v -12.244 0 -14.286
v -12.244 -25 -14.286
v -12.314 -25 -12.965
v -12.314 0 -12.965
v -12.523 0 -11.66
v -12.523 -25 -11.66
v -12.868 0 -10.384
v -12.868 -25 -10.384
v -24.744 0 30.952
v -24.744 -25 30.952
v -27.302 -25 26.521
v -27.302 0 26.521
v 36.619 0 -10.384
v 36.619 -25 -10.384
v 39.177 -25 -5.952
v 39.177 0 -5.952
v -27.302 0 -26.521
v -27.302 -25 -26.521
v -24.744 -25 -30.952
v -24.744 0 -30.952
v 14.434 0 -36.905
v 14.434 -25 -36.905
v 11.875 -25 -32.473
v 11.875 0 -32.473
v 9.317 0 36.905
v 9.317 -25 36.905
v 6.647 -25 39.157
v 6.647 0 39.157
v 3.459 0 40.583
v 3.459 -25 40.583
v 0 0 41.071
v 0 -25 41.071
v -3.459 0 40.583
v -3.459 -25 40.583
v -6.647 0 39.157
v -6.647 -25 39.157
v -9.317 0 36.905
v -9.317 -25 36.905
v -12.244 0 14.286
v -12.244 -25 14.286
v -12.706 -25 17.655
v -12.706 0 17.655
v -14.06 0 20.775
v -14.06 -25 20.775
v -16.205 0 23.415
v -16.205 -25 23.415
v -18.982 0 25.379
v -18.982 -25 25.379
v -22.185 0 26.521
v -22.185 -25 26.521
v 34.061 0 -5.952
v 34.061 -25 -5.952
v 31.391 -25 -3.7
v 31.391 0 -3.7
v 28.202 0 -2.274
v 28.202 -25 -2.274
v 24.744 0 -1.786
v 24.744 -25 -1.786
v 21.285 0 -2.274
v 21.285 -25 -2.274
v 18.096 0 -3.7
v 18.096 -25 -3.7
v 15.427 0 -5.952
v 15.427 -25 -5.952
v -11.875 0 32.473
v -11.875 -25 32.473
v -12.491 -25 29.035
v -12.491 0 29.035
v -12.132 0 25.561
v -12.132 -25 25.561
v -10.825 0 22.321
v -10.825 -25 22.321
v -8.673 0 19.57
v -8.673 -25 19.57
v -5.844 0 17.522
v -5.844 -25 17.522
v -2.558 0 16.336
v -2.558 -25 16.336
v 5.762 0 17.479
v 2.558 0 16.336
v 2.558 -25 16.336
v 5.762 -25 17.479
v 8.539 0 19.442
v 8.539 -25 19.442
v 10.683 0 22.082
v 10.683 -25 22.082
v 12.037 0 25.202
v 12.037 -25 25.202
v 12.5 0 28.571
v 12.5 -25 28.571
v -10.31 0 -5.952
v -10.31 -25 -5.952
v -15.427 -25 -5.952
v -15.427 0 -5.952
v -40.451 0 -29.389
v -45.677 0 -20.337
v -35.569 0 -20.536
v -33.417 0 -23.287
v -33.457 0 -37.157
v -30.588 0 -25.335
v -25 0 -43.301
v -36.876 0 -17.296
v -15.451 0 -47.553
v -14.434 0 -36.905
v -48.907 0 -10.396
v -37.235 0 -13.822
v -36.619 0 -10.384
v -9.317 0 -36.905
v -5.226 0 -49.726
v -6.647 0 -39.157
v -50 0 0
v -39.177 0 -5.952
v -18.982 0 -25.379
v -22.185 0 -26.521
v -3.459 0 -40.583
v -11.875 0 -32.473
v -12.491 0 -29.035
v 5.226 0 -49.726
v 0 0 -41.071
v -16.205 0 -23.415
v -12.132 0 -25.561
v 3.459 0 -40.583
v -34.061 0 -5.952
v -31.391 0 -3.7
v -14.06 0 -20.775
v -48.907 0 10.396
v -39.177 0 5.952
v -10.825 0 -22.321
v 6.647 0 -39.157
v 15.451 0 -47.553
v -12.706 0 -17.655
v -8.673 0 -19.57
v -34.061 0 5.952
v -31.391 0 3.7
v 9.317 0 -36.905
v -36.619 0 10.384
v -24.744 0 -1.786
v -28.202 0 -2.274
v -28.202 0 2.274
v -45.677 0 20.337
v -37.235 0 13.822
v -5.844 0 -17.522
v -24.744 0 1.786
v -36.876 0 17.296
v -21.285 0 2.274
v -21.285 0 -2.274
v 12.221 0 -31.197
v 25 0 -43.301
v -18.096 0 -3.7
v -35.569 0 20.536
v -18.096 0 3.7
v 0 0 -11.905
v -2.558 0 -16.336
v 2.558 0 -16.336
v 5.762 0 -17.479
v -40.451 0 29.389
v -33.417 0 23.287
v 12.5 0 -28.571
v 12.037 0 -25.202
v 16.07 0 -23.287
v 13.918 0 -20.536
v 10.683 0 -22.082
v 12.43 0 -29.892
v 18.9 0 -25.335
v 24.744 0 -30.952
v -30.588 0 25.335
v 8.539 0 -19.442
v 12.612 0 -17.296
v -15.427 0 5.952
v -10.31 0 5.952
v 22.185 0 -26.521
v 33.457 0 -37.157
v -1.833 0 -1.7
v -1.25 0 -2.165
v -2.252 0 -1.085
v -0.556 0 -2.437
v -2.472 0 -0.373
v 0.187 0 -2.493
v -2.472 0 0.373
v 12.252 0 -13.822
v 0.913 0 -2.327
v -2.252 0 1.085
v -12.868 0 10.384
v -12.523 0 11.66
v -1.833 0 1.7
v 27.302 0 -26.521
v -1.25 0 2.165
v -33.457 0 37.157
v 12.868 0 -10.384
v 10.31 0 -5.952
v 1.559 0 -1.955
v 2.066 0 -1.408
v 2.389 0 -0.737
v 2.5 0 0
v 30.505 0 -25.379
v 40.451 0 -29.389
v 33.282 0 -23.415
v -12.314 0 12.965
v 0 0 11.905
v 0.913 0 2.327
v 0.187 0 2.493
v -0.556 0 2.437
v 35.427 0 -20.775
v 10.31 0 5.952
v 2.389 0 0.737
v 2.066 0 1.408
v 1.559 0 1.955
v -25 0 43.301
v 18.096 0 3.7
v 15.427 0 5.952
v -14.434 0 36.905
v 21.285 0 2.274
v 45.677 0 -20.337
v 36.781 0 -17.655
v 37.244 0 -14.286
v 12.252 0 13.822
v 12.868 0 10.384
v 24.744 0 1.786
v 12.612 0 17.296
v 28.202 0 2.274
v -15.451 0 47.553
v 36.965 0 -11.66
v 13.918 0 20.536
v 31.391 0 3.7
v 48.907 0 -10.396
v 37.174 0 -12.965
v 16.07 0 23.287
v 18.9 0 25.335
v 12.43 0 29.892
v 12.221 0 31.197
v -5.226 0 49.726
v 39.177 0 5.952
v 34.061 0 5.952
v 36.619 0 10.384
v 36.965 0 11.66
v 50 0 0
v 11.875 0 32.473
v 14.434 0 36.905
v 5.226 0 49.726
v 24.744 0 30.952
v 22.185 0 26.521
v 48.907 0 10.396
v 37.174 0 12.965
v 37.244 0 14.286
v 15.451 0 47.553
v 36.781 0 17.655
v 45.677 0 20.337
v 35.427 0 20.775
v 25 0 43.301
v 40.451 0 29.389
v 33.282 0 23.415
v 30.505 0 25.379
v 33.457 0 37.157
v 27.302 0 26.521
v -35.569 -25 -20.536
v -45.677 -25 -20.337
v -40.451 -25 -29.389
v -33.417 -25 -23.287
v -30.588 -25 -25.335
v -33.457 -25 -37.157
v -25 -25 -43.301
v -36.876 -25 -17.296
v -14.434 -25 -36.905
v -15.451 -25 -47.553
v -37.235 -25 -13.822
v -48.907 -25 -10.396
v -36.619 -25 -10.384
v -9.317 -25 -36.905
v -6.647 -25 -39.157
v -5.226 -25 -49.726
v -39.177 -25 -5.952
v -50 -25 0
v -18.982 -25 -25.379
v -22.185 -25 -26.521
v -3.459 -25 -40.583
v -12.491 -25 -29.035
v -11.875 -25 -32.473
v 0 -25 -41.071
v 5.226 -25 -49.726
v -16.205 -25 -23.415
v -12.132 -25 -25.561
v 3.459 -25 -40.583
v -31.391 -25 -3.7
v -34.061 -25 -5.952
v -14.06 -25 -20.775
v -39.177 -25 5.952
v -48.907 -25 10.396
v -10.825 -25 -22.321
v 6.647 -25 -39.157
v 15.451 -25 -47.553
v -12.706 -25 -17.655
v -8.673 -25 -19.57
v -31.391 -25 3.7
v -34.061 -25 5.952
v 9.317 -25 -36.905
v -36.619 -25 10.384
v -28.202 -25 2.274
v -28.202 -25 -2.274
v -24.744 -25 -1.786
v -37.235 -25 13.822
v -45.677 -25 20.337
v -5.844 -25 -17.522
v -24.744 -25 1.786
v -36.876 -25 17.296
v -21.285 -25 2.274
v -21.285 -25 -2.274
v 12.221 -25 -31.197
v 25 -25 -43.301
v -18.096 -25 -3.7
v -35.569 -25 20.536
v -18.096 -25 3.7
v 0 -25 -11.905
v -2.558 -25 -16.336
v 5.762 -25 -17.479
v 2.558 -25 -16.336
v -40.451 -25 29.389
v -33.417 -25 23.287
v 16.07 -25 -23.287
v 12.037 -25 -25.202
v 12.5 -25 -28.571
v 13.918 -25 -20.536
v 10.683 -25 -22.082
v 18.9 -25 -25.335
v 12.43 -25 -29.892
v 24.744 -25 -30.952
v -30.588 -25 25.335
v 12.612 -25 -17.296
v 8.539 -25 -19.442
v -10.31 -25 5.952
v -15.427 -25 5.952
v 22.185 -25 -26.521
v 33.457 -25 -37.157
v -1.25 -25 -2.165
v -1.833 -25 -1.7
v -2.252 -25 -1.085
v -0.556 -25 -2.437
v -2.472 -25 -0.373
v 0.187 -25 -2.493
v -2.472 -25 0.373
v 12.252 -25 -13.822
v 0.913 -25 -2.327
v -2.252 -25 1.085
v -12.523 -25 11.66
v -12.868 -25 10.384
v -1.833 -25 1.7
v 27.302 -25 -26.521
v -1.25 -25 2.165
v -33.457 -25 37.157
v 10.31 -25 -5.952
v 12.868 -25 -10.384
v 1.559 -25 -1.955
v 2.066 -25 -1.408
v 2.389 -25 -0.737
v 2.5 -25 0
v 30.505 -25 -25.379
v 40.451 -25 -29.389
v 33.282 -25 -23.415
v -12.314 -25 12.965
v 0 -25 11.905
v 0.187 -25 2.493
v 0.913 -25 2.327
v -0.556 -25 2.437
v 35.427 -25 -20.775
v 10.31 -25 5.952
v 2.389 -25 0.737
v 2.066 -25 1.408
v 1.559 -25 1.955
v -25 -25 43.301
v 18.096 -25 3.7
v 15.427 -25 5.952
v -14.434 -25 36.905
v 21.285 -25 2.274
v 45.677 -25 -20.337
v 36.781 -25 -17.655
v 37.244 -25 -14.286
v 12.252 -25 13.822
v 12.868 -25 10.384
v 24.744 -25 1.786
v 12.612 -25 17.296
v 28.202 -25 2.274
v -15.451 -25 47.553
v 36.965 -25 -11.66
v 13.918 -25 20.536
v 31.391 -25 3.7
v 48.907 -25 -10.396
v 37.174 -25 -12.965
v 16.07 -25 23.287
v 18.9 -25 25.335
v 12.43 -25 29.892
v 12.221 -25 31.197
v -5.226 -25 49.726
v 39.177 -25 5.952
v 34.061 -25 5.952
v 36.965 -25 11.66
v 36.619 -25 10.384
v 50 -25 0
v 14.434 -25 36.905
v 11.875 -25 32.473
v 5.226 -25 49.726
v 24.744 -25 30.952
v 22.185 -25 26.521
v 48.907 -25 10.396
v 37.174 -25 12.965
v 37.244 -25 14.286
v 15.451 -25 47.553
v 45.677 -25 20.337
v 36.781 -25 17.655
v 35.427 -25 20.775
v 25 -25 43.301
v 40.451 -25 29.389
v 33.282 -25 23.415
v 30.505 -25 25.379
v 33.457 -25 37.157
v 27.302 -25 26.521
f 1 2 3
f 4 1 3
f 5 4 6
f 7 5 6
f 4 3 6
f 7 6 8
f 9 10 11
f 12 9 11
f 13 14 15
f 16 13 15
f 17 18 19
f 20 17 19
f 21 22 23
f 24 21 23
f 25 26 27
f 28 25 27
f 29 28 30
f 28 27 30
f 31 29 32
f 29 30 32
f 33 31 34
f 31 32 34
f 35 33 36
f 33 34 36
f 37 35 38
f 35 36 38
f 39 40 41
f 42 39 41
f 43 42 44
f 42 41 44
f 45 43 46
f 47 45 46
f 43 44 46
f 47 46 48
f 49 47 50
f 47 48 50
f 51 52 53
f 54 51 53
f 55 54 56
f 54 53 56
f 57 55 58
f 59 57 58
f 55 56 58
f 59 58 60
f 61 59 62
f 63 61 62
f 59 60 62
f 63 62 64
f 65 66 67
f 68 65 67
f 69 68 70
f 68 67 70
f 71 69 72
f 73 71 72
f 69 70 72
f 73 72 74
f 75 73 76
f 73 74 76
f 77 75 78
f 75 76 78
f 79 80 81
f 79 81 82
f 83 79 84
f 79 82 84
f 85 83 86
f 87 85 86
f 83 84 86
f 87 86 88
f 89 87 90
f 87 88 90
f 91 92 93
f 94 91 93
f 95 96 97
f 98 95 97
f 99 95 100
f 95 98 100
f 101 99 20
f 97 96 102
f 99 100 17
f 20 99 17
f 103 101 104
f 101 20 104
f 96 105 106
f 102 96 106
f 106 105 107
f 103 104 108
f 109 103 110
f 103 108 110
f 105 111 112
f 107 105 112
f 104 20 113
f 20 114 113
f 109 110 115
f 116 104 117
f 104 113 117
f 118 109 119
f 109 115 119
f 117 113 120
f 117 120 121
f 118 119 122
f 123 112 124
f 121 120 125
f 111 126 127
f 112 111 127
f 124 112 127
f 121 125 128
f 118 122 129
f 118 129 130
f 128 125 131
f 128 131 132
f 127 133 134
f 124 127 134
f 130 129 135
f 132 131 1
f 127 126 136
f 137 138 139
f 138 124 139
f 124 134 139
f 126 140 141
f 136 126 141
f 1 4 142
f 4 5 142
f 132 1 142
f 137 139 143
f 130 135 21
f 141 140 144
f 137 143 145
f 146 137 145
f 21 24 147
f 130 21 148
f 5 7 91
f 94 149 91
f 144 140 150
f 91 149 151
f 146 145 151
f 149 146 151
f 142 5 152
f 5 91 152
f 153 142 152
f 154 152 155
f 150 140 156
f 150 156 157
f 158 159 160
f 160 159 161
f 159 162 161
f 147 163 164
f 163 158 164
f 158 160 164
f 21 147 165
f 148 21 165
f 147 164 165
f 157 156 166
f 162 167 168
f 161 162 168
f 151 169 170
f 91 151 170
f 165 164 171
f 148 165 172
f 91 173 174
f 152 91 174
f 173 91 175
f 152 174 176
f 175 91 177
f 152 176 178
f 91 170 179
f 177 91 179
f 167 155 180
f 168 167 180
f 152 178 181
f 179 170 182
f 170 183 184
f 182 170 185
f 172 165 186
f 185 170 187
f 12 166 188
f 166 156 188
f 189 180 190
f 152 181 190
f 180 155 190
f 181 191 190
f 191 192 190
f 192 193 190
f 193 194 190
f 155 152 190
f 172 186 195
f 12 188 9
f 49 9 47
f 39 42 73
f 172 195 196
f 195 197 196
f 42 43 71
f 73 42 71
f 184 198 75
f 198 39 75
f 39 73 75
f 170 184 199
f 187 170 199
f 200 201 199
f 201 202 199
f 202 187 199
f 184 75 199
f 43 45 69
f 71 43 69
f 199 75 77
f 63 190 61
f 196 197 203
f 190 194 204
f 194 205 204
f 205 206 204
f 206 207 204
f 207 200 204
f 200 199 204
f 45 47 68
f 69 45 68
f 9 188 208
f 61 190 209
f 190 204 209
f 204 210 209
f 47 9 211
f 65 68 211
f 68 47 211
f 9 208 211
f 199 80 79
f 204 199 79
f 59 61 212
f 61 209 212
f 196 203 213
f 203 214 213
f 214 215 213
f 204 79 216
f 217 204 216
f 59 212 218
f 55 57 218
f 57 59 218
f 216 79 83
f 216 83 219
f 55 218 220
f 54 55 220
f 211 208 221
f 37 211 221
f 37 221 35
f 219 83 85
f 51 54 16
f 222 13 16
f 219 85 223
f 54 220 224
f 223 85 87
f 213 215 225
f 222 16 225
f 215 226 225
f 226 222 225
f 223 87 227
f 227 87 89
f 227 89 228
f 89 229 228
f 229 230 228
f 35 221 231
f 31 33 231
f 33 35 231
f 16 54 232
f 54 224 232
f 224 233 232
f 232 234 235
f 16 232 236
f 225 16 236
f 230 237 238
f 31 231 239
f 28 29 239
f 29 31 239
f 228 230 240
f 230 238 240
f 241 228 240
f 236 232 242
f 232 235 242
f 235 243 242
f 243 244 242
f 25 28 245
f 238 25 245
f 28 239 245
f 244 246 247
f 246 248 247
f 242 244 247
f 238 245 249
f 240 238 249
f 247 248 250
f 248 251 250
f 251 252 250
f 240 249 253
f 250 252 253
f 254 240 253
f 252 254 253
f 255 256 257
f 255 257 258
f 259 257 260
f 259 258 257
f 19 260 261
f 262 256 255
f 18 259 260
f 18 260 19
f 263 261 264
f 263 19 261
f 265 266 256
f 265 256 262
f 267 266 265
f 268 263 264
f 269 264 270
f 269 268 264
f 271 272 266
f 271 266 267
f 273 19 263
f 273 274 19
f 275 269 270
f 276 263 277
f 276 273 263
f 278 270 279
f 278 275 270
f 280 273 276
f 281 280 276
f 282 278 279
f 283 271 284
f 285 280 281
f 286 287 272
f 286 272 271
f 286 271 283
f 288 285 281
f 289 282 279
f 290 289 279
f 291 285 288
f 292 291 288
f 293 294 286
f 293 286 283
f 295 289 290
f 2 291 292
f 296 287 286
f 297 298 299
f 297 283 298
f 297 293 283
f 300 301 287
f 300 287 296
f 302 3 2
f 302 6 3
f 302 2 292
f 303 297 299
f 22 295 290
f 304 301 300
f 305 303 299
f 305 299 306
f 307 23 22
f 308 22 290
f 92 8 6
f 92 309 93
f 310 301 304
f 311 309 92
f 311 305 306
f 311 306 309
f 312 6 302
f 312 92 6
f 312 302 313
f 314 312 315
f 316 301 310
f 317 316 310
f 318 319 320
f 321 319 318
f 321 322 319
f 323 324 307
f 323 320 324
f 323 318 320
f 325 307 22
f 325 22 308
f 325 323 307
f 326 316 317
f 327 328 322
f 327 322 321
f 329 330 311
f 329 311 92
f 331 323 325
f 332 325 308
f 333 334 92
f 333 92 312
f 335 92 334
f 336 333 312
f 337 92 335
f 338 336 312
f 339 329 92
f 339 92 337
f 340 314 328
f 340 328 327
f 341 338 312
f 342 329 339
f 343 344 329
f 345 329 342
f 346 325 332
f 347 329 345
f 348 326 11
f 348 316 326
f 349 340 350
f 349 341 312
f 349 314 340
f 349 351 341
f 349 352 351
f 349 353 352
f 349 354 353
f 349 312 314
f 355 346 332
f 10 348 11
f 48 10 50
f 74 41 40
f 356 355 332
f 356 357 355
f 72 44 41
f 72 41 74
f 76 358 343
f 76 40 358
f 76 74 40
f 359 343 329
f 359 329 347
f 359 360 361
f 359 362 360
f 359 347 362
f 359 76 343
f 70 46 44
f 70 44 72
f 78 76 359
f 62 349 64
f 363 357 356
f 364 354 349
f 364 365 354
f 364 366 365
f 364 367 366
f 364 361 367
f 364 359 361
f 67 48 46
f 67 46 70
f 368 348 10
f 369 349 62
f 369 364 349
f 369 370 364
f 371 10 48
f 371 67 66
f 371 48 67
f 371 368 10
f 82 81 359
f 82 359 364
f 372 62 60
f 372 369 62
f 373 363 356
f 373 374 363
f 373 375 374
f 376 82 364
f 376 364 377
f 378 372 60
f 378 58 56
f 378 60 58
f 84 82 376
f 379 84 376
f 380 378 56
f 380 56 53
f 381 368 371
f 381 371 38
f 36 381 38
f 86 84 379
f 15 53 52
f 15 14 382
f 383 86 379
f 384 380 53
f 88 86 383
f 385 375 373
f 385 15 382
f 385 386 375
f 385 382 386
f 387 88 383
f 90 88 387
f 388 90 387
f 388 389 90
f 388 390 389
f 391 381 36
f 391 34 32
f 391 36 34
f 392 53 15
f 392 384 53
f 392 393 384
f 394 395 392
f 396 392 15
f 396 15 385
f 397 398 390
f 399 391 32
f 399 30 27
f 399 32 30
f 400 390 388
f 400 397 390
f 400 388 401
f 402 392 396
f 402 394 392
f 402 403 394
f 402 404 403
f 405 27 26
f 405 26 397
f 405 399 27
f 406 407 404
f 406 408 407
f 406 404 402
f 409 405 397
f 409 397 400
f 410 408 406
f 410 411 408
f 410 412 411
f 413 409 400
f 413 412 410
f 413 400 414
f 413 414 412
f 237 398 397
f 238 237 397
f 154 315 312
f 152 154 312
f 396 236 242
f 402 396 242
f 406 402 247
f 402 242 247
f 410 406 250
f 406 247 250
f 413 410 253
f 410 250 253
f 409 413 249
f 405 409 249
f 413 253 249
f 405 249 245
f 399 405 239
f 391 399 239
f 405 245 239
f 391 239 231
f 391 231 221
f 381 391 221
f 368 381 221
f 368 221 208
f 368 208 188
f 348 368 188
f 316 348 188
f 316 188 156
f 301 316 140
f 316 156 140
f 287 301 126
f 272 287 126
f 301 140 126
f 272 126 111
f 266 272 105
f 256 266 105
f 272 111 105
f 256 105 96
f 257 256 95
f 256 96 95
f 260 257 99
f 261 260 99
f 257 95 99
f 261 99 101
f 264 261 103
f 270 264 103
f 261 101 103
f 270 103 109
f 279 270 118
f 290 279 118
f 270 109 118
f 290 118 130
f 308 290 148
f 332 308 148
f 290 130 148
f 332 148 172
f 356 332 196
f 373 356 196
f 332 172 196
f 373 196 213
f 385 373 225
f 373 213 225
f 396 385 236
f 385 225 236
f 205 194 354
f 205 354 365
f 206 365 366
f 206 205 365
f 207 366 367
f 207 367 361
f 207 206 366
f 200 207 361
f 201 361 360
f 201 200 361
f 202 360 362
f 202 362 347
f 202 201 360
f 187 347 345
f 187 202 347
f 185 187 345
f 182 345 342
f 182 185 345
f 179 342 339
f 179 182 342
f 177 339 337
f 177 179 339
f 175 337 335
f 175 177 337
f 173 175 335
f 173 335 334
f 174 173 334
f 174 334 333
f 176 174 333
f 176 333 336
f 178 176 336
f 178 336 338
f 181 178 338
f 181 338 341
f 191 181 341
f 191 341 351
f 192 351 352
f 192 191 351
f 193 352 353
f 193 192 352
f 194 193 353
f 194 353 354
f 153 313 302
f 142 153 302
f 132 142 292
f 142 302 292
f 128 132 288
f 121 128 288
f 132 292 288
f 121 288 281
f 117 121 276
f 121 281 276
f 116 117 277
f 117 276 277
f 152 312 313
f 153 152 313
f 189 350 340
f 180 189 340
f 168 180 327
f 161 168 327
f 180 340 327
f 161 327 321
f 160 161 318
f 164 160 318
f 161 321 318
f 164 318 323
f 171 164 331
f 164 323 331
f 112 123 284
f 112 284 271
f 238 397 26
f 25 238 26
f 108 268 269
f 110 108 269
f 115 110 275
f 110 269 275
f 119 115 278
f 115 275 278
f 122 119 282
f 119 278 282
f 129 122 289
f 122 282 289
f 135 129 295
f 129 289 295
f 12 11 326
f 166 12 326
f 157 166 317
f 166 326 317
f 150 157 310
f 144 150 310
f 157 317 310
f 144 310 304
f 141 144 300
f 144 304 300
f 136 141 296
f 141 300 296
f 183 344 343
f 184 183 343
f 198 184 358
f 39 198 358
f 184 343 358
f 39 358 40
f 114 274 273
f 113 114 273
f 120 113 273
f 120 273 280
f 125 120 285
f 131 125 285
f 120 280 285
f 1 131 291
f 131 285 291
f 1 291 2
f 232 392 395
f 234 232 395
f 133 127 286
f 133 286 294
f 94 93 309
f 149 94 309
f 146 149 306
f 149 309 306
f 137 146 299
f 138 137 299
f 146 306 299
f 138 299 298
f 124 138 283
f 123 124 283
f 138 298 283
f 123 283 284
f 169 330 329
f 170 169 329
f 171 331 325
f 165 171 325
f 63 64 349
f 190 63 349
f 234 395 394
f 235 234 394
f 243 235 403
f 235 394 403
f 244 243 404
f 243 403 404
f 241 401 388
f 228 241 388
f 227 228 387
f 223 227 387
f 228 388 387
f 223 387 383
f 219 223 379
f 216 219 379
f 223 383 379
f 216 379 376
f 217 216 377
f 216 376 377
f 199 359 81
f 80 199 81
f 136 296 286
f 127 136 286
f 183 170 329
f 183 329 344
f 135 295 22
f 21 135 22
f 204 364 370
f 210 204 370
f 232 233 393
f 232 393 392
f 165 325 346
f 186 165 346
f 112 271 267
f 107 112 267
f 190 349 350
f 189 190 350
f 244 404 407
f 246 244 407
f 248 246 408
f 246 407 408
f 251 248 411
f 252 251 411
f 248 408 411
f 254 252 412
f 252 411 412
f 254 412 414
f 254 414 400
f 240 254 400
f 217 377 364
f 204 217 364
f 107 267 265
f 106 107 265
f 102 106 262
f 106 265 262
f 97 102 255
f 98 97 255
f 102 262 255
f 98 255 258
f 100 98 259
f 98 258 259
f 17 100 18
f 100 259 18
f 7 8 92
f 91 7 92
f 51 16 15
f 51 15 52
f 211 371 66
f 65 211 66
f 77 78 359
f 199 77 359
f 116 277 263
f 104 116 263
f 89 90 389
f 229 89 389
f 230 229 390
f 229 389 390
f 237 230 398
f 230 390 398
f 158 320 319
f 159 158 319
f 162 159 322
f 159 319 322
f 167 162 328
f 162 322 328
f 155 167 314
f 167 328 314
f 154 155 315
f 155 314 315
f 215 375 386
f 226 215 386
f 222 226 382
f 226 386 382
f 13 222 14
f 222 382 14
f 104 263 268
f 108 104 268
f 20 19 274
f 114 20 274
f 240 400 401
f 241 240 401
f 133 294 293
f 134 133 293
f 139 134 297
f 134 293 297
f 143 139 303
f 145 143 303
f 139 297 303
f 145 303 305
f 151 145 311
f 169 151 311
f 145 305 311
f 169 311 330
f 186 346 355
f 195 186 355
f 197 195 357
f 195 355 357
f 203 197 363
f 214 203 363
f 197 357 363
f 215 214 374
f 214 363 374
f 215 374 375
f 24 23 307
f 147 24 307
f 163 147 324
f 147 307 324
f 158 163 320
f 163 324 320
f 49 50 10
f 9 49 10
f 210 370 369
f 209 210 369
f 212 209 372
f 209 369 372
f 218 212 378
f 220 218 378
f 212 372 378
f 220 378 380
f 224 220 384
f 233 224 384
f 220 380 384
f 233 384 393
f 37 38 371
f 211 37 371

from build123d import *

# Parameters (mm, degrees)
F0_R     = 50
F0_R_2   = 2.5
F1_DEPTH = 25
F3_DEPTH = 25
F4_DEPTH = 25


with BuildPart() as f1:
    # F0 (on Front) → F1 (new body)
    with BuildSketch(Plane.XZ):
        Circle(F0_R)
        Circle(F0_R_2, mode=Mode.SUBTRACT)
    extrude(amount=F1_DEPTH)

    # F2 (on face) → F3 (cut)
    with BuildSketch(Plane.XZ.offset(25)):
        with BuildLine():
            Line((11.875353318, 32.4734772094), (14.4337567297, 36.9047619048))
            Line((14.4337567297, 36.9047619048), (9.3169499062, 36.9047619048))
            ThreePointArc((9.3169499062, 36.9047619048), (10.8253175473, 34.8214285714), (11.875353318, 32.4734772094))
        make_face()
        with BuildLine():
            ThreePointArc((12.5, 28.5714285714), (12.3428504908, 30.5472933853), (11.875353318, 32.4734772094))
            Line((11.875353318, 32.4734772094), (2.5584034117, 16.3360466002))
            ThreePointArc((2.5584034117, 16.3360466002), (9.7012896732, 20.6888542028), (12.5, 28.5714285714))
        make_face()
        with BuildLine():
            Line((2.5584034117, 16.3360466002), (11.875353318, 32.4734772094))
            ThreePointArc((11.875353318, 32.4734772094), (10.8253175473, 34.8214285714), (9.3169499062, 36.9047619048))
            Line((9.3169499062, 36.9047619048), (-9.3169499062, 36.9047619048))
            ThreePointArc((-9.3169499062, 36.9047619048), (-10.8253175473, 34.8214285714), (-11.875353318, 32.4734772094))
            Line((-11.875353318, 32.4734772094), (-2.5584034117, 16.3360466002))
            ThreePointArc((-2.5584034117, 16.3360466002), (0, 16.0714285714), (2.5584034117, 16.3360466002))
        make_face()
        with BuildLine():
            Line((-9.3169499062, 36.9047619048), (9.3169499062, 36.9047619048))
            ThreePointArc((9.3169499062, 36.9047619048), (0, 41.0714285714), (-9.3169499062, 36.9047619048))
        make_face()
        with BuildLine():
            Line((0, 11.9047619048), (2.5584034117, 16.3360466002))
            ThreePointArc((2.5584034117, 16.3360466002), (0, 16.0714285714), (-2.5584034117, 16.3360466002))
            Line((-2.5584034117, 16.3360466002), (0, 11.9047619048))
        make_face()
        with BuildLine():
            ThreePointArc((-11.875353318, 32.4734772094), (-10.8253175473, 34.8214285714), (-9.3169499062, 36.9047619048))
            Line((-9.3169499062, 36.9047619048), (-14.4337567297, 36.9047619048))
            Line((-14.4337567297, 36.9047619048), (-11.875353318, 32.4734772094))
        make_face()
        with BuildLine():
            ThreePointArc((-11.875353318, 32.4734772094), (-10.8253175473, 22.3214285714), (-2.5584034117, 16.3360466002))
            Line((-2.5584034117, 16.3360466002), (-11.875353318, 32.4734772094))
        make_face()
        with BuildLine():
            Line((27.301986377, 26.521096257), (24.7435829653, 30.9523809524))
            Line((24.7435829653, 30.9523809524), (22.1851795535, 26.521096257))
            ThreePointArc((22.1851795535, 26.521096257), (24.7435829653, 26.7857142857), (27.301986377, 26.521096257))
        make_face()
        with BuildLine():
            ThreePointArc((37.2435829653, 14.2857142857), (34.4448726385, 22.1682886543), (27.301986377, 26.521096257))
            Line((27.301986377, 26.521096257), (36.6189362833, 10.3836656478))
            ThreePointArc((36.6189362833, 10.3836656478), (37.086433456, 12.3098494719), (37.2435829653, 14.2857142857))
        make_face()
        with BuildLine():
            Line((36.6189362833, 10.3836656478), (27.301986377, 26.521096257))
            ThreePointArc((27.301986377, 26.521096257), (24.7435829653, 26.7857142857), (22.1851795535, 26.521096257))
            Line((22.1851795535, 26.521096257), (12.8682296473, 10.3836656478))
            ThreePointArc((12.8682296473, 10.3836656478), (13.918265418, 8.0357142857), (15.426633059, 5.9523809524))
            Line((15.426633059, 5.9523809524), (34.0605328715, 5.9523809524))
            ThreePointArc((34.0605328715, 5.9523809524), (35.5689005126, 8.0357142857), (36.6189362833, 10.3836656478))
        make_face()
        with BuildLine():
            Line((12.8682296473, 10.3836656478), (22.1851795535, 26.521096257))
            ThreePointArc((22.1851795535, 26.521096257), (13.918265418, 20.5357142857), (12.8682296473, 10.3836656478))
        make_face()
        with BuildLine():
            Line((39.177339695, 5.9523809524), (36.6189362833, 10.3836656478))
            ThreePointArc((36.6189362833, 10.3836656478), (35.5689005126, 8.0357142857), (34.0605328715, 5.9523809524))
            Line((34.0605328715, 5.9523809524), (39.177339695, 5.9523809524))
        make_face()
        with BuildLine():
            ThreePointArc((15.426633059, 5.9523809524), (13.918265418, 8.0357142857), (12.8682296473, 10.3836656478))
            Line((12.8682296473, 10.3836656478), (10.3098262355, 5.9523809524))
            Line((10.3098262355, 5.9523809524), (15.426633059, 5.9523809524))
        make_face()
        with BuildLine():
            ThreePointArc((15.426633059, 5.9523809524), (24.7435829653, 1.7857142857), (34.0605328715, 5.9523809524))
            Line((34.0605328715, 5.9523809524), (15.426633059, 5.9523809524))
        make_face()
        with BuildLine():
            Line((-36.6189362833, 10.3836656478), (-39.177339695, 5.9523809524))
            Line((-39.177339695, 5.9523809524), (-34.0605328715, 5.9523809524))
            ThreePointArc((-34.0605328715, 5.9523809524), (-35.5689005126, 8.0357142857), (-36.6189362833, 10.3836656478))
        make_face()
        with BuildLine():
            ThreePointArc((-27.301986377, 26.521096257), (-35.5689005126, 20.5357142857), (-36.6189362833, 10.3836656478))
            Line((-36.6189362833, 10.3836656478), (-27.301986377, 26.521096257))
        make_face()
        with BuildLine():
            Line((-27.301986377, 26.521096257), (-36.6189362833, 10.3836656478))
            ThreePointArc((-36.6189362833, 10.3836656478), (-35.5689005126, 8.0357142857), (-34.0605328715, 5.9523809524))
            Line((-34.0605328715, 5.9523809524), (-15.426633059, 5.9523809524))
            ThreePointArc((-15.426633059, 5.9523809524), (-13.918265418, 8.0357142857), (-12.8682296473, 10.3836656478))
            Line((-12.8682296473, 10.3836656478), (-22.1851795535, 26.521096257))
            ThreePointArc((-22.1851795535, 26.521096257), (-24.7435829653, 26.7857142857), (-27.301986377, 26.521096257))
        make_face()
        with BuildLine():
            Line((-15.426633059, 5.9523809524), (-34.0605328715, 5.9523809524))
            ThreePointArc((-34.0605328715, 5.9523809524), (-24.7435829653, 1.7857142857), (-15.426633059, 5.9523809524))
        make_face()
        with BuildLine():
            Line((-24.7435829653, 30.9523809524), (-27.301986377, 26.521096257))
            ThreePointArc((-27.301986377, 26.521096257), (-24.7435829653, 26.7857142857), (-22.1851795535, 26.521096257))
            Line((-22.1851795535, 26.521096257), (-24.7435829653, 30.9523809524))
        make_face()
        with BuildLine():
            ThreePointArc((-12.8682296473, 10.3836656478), (-13.918265418, 8.0357142857), (-15.426633059, 5.9523809524))
            Line((-15.426633059, 5.9523809524), (-10.3098262355, 5.9523809524))
            Line((-10.3098262355, 5.9523809524), (-12.8682296473, 10.3836656478))
        make_face()
        with BuildLine():
            ThreePointArc((-12.2435829653, 14.2857142857), (-15.0422932921, 22.1682886543), (-22.1851795535, 26.521096257))
            Line((-22.1851795535, 26.521096257), (-12.8682296473, 10.3836656478))
            ThreePointArc((-12.8682296473, 10.3836656478), (-12.4007324745, 12.3098494719), (-12.2435829653, 14.2857142857))
        make_face()
        with BuildLine():
            Line((-12.8682296473, -10.3836656478), (-10.3098262355, -5.9523809524))
            Line((-10.3098262355, -5.9523809524), (-15.426633059, -5.9523809524))
            ThreePointArc((-15.426633059, -5.9523809524), (-13.918265418, -8.0357142857), (-12.8682296473, -10.3836656478))
        make_face()
        with BuildLine():
            ThreePointArc((-12.2435829653, -14.2857142857), (-12.4007324745, -12.3098494719), (-12.8682296473, -10.3836656478))
            Line((-12.8682296473, -10.3836656478), (-22.1851795535, -26.521096257))
            ThreePointArc((-22.1851795535, -26.521096257), (-15.0422932921, -22.1682886543), (-12.2435829653, -14.2857142857))
        make_face()
        with BuildLine():
            Line((-22.1851795535, -26.521096257), (-12.8682296473, -10.3836656478))
            ThreePointArc((-12.8682296473, -10.3836656478), (-13.918265418, -8.0357142857), (-15.426633059, -5.9523809524))
            Line((-15.426633059, -5.9523809524), (-34.0605328715, -5.9523809524))
            ThreePointArc((-34.0605328715, -5.9523809524), (-35.5689005126, -8.0357142857), (-36.6189362833, -10.3836656478))
            Line((-36.6189362833, -10.3836656478), (-27.301986377, -26.521096257))
            ThreePointArc((-27.301986377, -26.521096257), (-24.7435829653, -26.7857142857), (-22.1851795535, -26.521096257))
        make_face()
        with BuildLine():
            Line((-34.0605328715, -5.9523809524), (-15.426633059, -5.9523809524))
            ThreePointArc((-15.426633059, -5.9523809524), (-24.7435829653, -1.7857142857), (-34.0605328715, -5.9523809524))
        make_face()
        with BuildLine():
            Line((-24.7435829653, -30.9523809524), (-22.1851795535, -26.521096257))
            ThreePointArc((-22.1851795535, -26.521096257), (-24.7435829653, -26.7857142857), (-27.301986377, -26.521096257))
            Line((-27.301986377, -26.521096257), (-24.7435829653, -30.9523809524))
        make_face()
        with BuildLine():
            ThreePointArc((-36.6189362833, -10.3836656478), (-35.5689005126, -8.0357142857), (-34.0605328715, -5.9523809524))
            Line((-34.0605328715, -5.9523809524), (-39.177339695, -5.9523809524))
            Line((-39.177339695, -5.9523809524), (-36.6189362833, -10.3836656478))
        make_face()
        with BuildLine():
            ThreePointArc((-36.6189362833, -10.3836656478), (-35.5689005126, -20.5357142857), (-27.301986377, -26.521096257))
            Line((-27.301986377, -26.521096257), (-36.6189362833, -10.3836656478))
        make_face()
        with BuildLine():
            Line((9.3169499062, -36.9047619048), (14.4337567297, -36.9047619048))
            Line((14.4337567297, -36.9047619048), (11.875353318, -32.4734772094))
            ThreePointArc((11.875353318, -32.4734772094), (10.8253175473, -34.8214285714), (9.3169499062, -36.9047619048))
        make_face()
        with BuildLine():
            ThreePointArc((-9.3169499062, -36.9047619048), (0, -41.0714285714), (9.3169499062, -36.9047619048))
            Line((9.3169499062, -36.9047619048), (-9.3169499062, -36.9047619048))
        make_face()
        with BuildLine():
            Line((-9.3169499062, -36.9047619048), (9.3169499062, -36.9047619048))
            ThreePointArc((9.3169499062, -36.9047619048), (10.8253175473, -34.8214285714), (11.875353318, -32.4734772094))
            Line((11.875353318, -32.4734772094), (2.5584034117, -16.3360466002))
            ThreePointArc((2.5584034117, -16.3360466002), (0, -16.0714285714), (-2.5584034117, -16.3360466002))
            Line((-2.5584034117, -16.3360466002), (-11.875353318, -32.4734772094))
            ThreePointArc((-11.875353318, -32.4734772094), (-10.8253175473, -34.8214285714), (-9.3169499062, -36.9047619048))
        make_face()
        with BuildLine():
            Line((2.5584034117, -16.3360466002), (11.875353318, -32.4734772094))
            ThreePointArc((11.875353318, -32.4734772094), (12.3428504908, -30.5472933853), (12.5, -28.5714285714))
            ThreePointArc((12.5, -28.5714285714), (9.7012896732, -20.6888542028), (2.5584034117, -16.3360466002))
        make_face()
        with BuildLine():
            Line((-14.4337567297, -36.9047619048), (-9.3169499062, -36.9047619048))
            ThreePointArc((-9.3169499062, -36.9047619048), (-10.8253175473, -34.8214285714), (-11.875353318, -32.4734772094))
            Line((-11.875353318, -32.4734772094), (-14.4337567297, -36.9047619048))
        make_face()
        with BuildLine():
            ThreePointArc((-2.5584034117, -16.3360466002), (0, -16.0714285714), (2.5584034117, -16.3360466002))
            Line((2.5584034117, -16.3360466002), (0, -11.9047619048))
            Line((0, -11.9047619048), (-2.5584034117, -16.3360466002))
        make_face()
        with BuildLine():
            ThreePointArc((-2.5584034117, -16.3360466002), (-10.8253175473, -22.3214285714), (-11.875353318, -32.4734772094))
            Line((-11.875353318, -32.4734772094), (-2.5584034117, -16.3360466002))
        make_face()
        with BuildLine():
            Line((15.426633059, -5.9523809524), (10.3098262355, -5.9523809524))
            Line((10.3098262355, -5.9523809524), (12.8682296473, -10.3836656478))
            ThreePointArc((12.8682296473, -10.3836656478), (13.918265418, -8.0357142857), (15.426633059, -5.9523809524))
        make_face()
        with BuildLine():
            ThreePointArc((34.0605328715, -5.9523809524), (24.7435829653, -1.7857142857), (15.426633059, -5.9523809524))
            Line((15.426633059, -5.9523809524), (34.0605328715, -5.9523809524))
        make_face()
        with BuildLine():
            Line((34.0605328715, -5.9523809524), (15.426633059, -5.9523809524))
            ThreePointArc((15.426633059, -5.9523809524), (13.918265418, -8.0357142857), (12.8682296473, -10.3836656478))
            Line((12.8682296473, -10.3836656478), (22.1851795535, -26.521096257))
            ThreePointArc((22.1851795535, -26.521096257), (24.7435829653, -26.7857142857), (27.301986377, -26.521096257))
            Line((27.301986377, -26.521096257), (36.6189362833, -10.3836656478))
            ThreePointArc((36.6189362833, -10.3836656478), (35.5689005126, -8.0357142857), (34.0605328715, -5.9523809524))
        make_face()
        with BuildLine():
            Line((22.1851795535, -26.521096257), (12.8682296473, -10.3836656478))
            ThreePointArc((12.8682296473, -10.3836656478), (13.918265418, -20.5357142857), (22.1851795535, -26.521096257))
        make_face()
        with BuildLine():
            Line((39.177339695, -5.9523809524), (34.0605328715, -5.9523809524))
            ThreePointArc((34.0605328715, -5.9523809524), (35.5689005126, -8.0357142857), (36.6189362833, -10.3836656478))
            Line((36.6189362833, -10.3836656478), (39.177339695, -5.9523809524))
        make_face()
        with BuildLine():
            ThreePointArc((27.301986377, -26.521096257), (24.7435829653, -26.7857142857), (22.1851795535, -26.521096257))
            Line((22.1851795535, -26.521096257), (24.7435829653, -30.9523809524))
            Line((24.7435829653, -30.9523809524), (27.301986377, -26.521096257))
        make_face()
        with BuildLine():
            ThreePointArc((37.2435829653, -14.2857142857), (37.086433456, -12.3098494719), (36.6189362833, -10.3836656478))
            Line((36.6189362833, -10.3836656478), (27.301986377, -26.521096257))
            ThreePointArc((27.301986377, -26.521096257), (34.4448726385, -22.1682886543), (37.2435829653, -14.2857142857))
        make_face()
    extrude(amount=-F3_DEPTH, mode=Mode.SUBTRACT)

    # F2 (on face) → F4 (cut)
    with BuildSketch(Plane.XZ.offset(25)):
        with BuildLine():
            Line((11.875353318, 32.4734772094), (14.4337567297, 36.9047619048))
            Line((14.4337567297, 36.9047619048), (9.3169499062, 36.9047619048))
            ThreePointArc((9.3169499062, 36.9047619048), (10.8253175473, 34.8214285714), (11.875353318, 32.4734772094))
        make_face()
        with BuildLine():
            ThreePointArc((12.5, 28.5714285714), (12.3428504908, 30.5472933853), (11.875353318, 32.4734772094))
            Line((11.875353318, 32.4734772094), (2.5584034117, 16.3360466002))
            ThreePointArc((2.5584034117, 16.3360466002), (9.7012896732, 20.6888542028), (12.5, 28.5714285714))
        make_face()
        with BuildLine():
            Line((0, 11.9047619048), (2.5584034117, 16.3360466002))
            ThreePointArc((2.5584034117, 16.3360466002), (0, 16.0714285714), (-2.5584034117, 16.3360466002))
            Line((-2.5584034117, 16.3360466002), (0, 11.9047619048))
        make_face()
        with BuildLine():
            ThreePointArc((-11.875353318, 32.4734772094), (-10.8253175473, 22.3214285714), (-2.5584034117, 16.3360466002))
            Line((-2.5584034117, 16.3360466002), (-11.875353318, 32.4734772094))
        make_face()
        with BuildLine():
            ThreePointArc((-11.875353318, 32.4734772094), (-10.8253175473, 34.8214285714), (-9.3169499062, 36.9047619048))
            Line((-9.3169499062, 36.9047619048), (-14.4337567297, 36.9047619048))
            Line((-14.4337567297, 36.9047619048), (-11.875353318, 32.4734772094))
        make_face()
        with BuildLine():
            Line((-9.3169499062, 36.9047619048), (9.3169499062, 36.9047619048))
            ThreePointArc((9.3169499062, 36.9047619048), (0, 41.0714285714), (-9.3169499062, 36.9047619048))
        make_face()
        with BuildLine():
            Line((27.301986377, 26.521096257), (24.7435829653, 30.9523809524))
            Line((24.7435829653, 30.9523809524), (22.1851795535, 26.521096257))
            ThreePointArc((22.1851795535, 26.521096257), (24.7435829653, 26.7857142857), (27.301986377, 26.521096257))
        make_face()
        with BuildLine():
            ThreePointArc((37.2435829653, 14.2857142857), (34.4448726385, 22.1682886543), (27.301986377, 26.521096257))
            Line((27.301986377, 26.521096257), (36.6189362833, 10.3836656478))
            ThreePointArc((36.6189362833, 10.3836656478), (37.086433456, 12.3098494719), (37.2435829653, 14.2857142857))
        make_face()
        with BuildLine():
            Line((39.177339695, 5.9523809524), (36.6189362833, 10.3836656478))
            ThreePointArc((36.6189362833, 10.3836656478), (35.5689005126, 8.0357142857), (34.0605328715, 5.9523809524))
            Line((34.0605328715, 5.9523809524), (39.177339695, 5.9523809524))
        make_face()
        with BuildLine():
            ThreePointArc((15.426633059, 5.9523809524), (24.7435829653, 1.7857142857), (34.0605328715, 5.9523809524))
            Line((34.0605328715, 5.9523809524), (15.426633059, 5.9523809524))
        make_face()
        with BuildLine():
            ThreePointArc((15.426633059, 5.9523809524), (13.918265418, 8.0357142857), (12.8682296473, 10.3836656478))
            Line((12.8682296473, 10.3836656478), (10.3098262355, 5.9523809524))
            Line((10.3098262355, 5.9523809524), (15.426633059, 5.9523809524))
        make_face()
        with BuildLine():
            Line((12.8682296473, 10.3836656478), (22.1851795535, 26.521096257))
            ThreePointArc((22.1851795535, 26.521096257), (13.918265418, 20.5357142857), (12.8682296473, 10.3836656478))
        make_face()
        with BuildLine():
            Line((-12.8682296473, -10.3836656478), (-10.3098262355, -5.9523809524))
            Line((-10.3098262355, -5.9523809524), (-15.426633059, -5.9523809524))
            ThreePointArc((-15.426633059, -5.9523809524), (-13.918265418, -8.0357142857), (-12.8682296473, -10.3836656478))
        make_face()
        with BuildLine():
            ThreePointArc((-12.2435829653, -14.2857142857), (-12.4007324745, -12.3098494719), (-12.8682296473, -10.3836656478))
            Line((-12.8682296473, -10.3836656478), (-22.1851795535, -26.521096257))
            ThreePointArc((-22.1851795535, -26.521096257), (-15.0422932921, -22.1682886543), (-12.2435829653, -14.2857142857))
        make_face()
        with BuildLine():
            Line((-24.7435829653, -30.9523809524), (-22.1851795535, -26.521096257))
            ThreePointArc((-22.1851795535, -26.521096257), (-24.7435829653, -26.7857142857), (-27.301986377, -26.521096257))
            Line((-27.301986377, -26.521096257), (-24.7435829653, -30.9523809524))
        make_face()
        with BuildLine():
            ThreePointArc((-36.6189362833, -10.3836656478), (-35.5689005126, -20.5357142857), (-27.301986377, -26.521096257))
            Line((-27.301986377, -26.521096257), (-36.6189362833, -10.3836656478))
        make_face()
        with BuildLine():
            ThreePointArc((-36.6189362833, -10.3836656478), (-35.5689005126, -8.0357142857), (-34.0605328715, -5.9523809524))
            Line((-34.0605328715, -5.9523809524), (-39.177339695, -5.9523809524))
            Line((-39.177339695, -5.9523809524), (-36.6189362833, -10.3836656478))
        make_face()
        with BuildLine():
            Line((-34.0605328715, -5.9523809524), (-15.426633059, -5.9523809524))
            ThreePointArc((-15.426633059, -5.9523809524), (-24.7435829653, -1.7857142857), (-34.0605328715, -5.9523809524))
        make_face()
        with BuildLine():
            Line((9.3169499062, -36.9047619048), (14.4337567297, -36.9047619048))
            Line((14.4337567297, -36.9047619048), (11.875353318, -32.4734772094))
            ThreePointArc((11.875353318, -32.4734772094), (10.8253175473, -34.8214285714), (9.3169499062, -36.9047619048))
        make_face()
        with BuildLine():
            ThreePointArc((-9.3169499062, -36.9047619048), (0, -41.0714285714), (9.3169499062, -36.9047619048))
            Line((9.3169499062, -36.9047619048), (-9.3169499062, -36.9047619048))
        make_face()
        with BuildLine():
            Line((-14.4337567297, -36.9047619048), (-9.3169499062, -36.9047619048))
            ThreePointArc((-9.3169499062, -36.9047619048), (-10.8253175473, -34.8214285714), (-11.875353318, -32.4734772094))
            Line((-11.875353318, -32.4734772094), (-14.4337567297, -36.9047619048))
        make_face()
        with BuildLine():
            ThreePointArc((-2.5584034117, -16.3360466002), (0, -16.0714285714), (2.5584034117, -16.3360466002))
            Line((2.5584034117, -16.3360466002), (0, -11.9047619048))
            Line((0, -11.9047619048), (-2.5584034117, -16.3360466002))
        make_face()
        with BuildLine():
            Line((2.5584034117, -16.3360466002), (11.875353318, -32.4734772094))
            ThreePointArc((11.875353318, -32.4734772094), (12.3428504908, -30.5472933853), (12.5, -28.5714285714))
            ThreePointArc((12.5, -28.5714285714), (9.7012896732, -20.6888542028), (2.5584034117, -16.3360466002))
        make_face()
        with BuildLine():
            ThreePointArc((-2.5584034117, -16.3360466002), (-10.8253175473, -22.3214285714), (-11.875353318, -32.4734772094))
            Line((-11.875353318, -32.4734772094), (-2.5584034117, -16.3360466002))
        make_face()
        with BuildLine():
            Line((15.426633059, -5.9523809524), (10.3098262355, -5.9523809524))
            Line((10.3098262355, -5.9523809524), (12.8682296473, -10.3836656478))
            ThreePointArc((12.8682296473, -10.3836656478), (13.918265418, -8.0357142857), (15.426633059, -5.9523809524))
        make_face()
        with BuildLine():
            ThreePointArc((34.0605328715, -5.9523809524), (24.7435829653, -1.7857142857), (15.426633059, -5.9523809524))
            Line((15.426633059, -5.9523809524), (34.0605328715, -5.9523809524))
        make_face()
        with BuildLine():
            Line((39.177339695, -5.9523809524), (34.0605328715, -5.9523809524))
            ThreePointArc((34.0605328715, -5.9523809524), (35.5689005126, -8.0357142857), (36.6189362833, -10.3836656478))
            Line((36.6189362833, -10.3836656478), (39.177339695, -5.9523809524))
        make_face()
        with BuildLine():
            ThreePointArc((37.2435829653, -14.2857142857), (37.086433456, -12.3098494719), (36.6189362833, -10.3836656478))
            Line((36.6189362833, -10.3836656478), (27.301986377, -26.521096257))
            ThreePointArc((27.301986377, -26.521096257), (34.4448726385, -22.1682886543), (37.2435829653, -14.2857142857))
        make_face()
        with BuildLine():
            ThreePointArc((27.301986377, -26.521096257), (24.7435829653, -26.7857142857), (22.1851795535, -26.521096257))
            Line((22.1851795535, -26.521096257), (24.7435829653, -30.9523809524))
            Line((24.7435829653, -30.9523809524), (27.301986377, -26.521096257))
        make_face()
        with BuildLine():
            Line((22.1851795535, -26.521096257), (12.8682296473, -10.3836656478))
            ThreePointArc((12.8682296473, -10.3836656478), (13.918265418, -20.5357142857), (22.1851795535, -26.521096257))
        make_face()
        with BuildLine():
            Line((2.5584034117, 16.3360466002), (11.875353318, 32.4734772094))
            ThreePointArc((11.875353318, 32.4734772094), (10.8253175473, 34.8214285714), (9.3169499062, 36.9047619048))
            Line((9.3169499062, 36.9047619048), (-9.3169499062, 36.9047619048))
            ThreePointArc((-9.3169499062, 36.9047619048), (-10.8253175473, 34.8214285714), (-11.875353318, 32.4734772094))
            Line((-11.875353318, 32.4734772094), (-2.5584034117, 16.3360466002))
            ThreePointArc((-2.5584034117, 16.3360466002), (0, 16.0714285714), (2.5584034117, 16.3360466002))
        make_face()
        with BuildLine():
            Line((36.6189362833, 10.3836656478), (27.301986377, 26.521096257))
            ThreePointArc((27.301986377, 26.521096257), (24.7435829653, 26.7857142857), (22.1851795535, 26.521096257))
            Line((22.1851795535, 26.521096257), (12.8682296473, 10.3836656478))
            ThreePointArc((12.8682296473, 10.3836656478), (13.918265418, 8.0357142857), (15.426633059, 5.9523809524))
            Line((15.426633059, 5.9523809524), (34.0605328715, 5.9523809524))
            ThreePointArc((34.0605328715, 5.9523809524), (35.5689005126, 8.0357142857), (36.6189362833, 10.3836656478))
        make_face()
        with BuildLine():
            Line((-22.1851795535, -26.521096257), (-12.8682296473, -10.3836656478))
            ThreePointArc((-12.8682296473, -10.3836656478), (-13.918265418, -8.0357142857), (-15.426633059, -5.9523809524))
            Line((-15.426633059, -5.9523809524), (-34.0605328715, -5.9523809524))
            ThreePointArc((-34.0605328715, -5.9523809524), (-35.5689005126, -8.0357142857), (-36.6189362833, -10.3836656478))
            Line((-36.6189362833, -10.3836656478), (-27.301986377, -26.521096257))
            ThreePointArc((-27.301986377, -26.521096257), (-24.7435829653, -26.7857142857), (-22.1851795535, -26.521096257))
        make_face()
        with BuildLine():
            Line((-9.3169499062, -36.9047619048), (9.3169499062, -36.9047619048))
            ThreePointArc((9.3169499062, -36.9047619048), (10.8253175473, -34.8214285714), (11.875353318, -32.4734772094))
            Line((11.875353318, -32.4734772094), (2.5584034117, -16.3360466002))
            ThreePointArc((2.5584034117, -16.3360466002), (0, -16.0714285714), (-2.5584034117, -16.3360466002))
            Line((-2.5584034117, -16.3360466002), (-11.875353318, -32.4734772094))
            ThreePointArc((-11.875353318, -32.4734772094), (-10.8253175473, -34.8214285714), (-9.3169499062, -36.9047619048))
        make_face()
        with BuildLine():
            Line((34.0605328715, -5.9523809524), (15.426633059, -5.9523809524))
            ThreePointArc((15.426633059, -5.9523809524), (13.918265418, -8.0357142857), (12.8682296473, -10.3836656478))
            Line((12.8682296473, -10.3836656478), (22.1851795535, -26.521096257))
            ThreePointArc((22.1851795535, -26.521096257), (24.7435829653, -26.7857142857), (27.301986377, -26.521096257))
            Line((27.301986377, -26.521096257), (36.6189362833, -10.3836656478))
            ThreePointArc((36.6189362833, -10.3836656478), (35.5689005126, -8.0357142857), (34.0605328715, -5.9523809524))
        make_face()
        with BuildLine():
            ThreePointArc((-12.8682296473, 10.3836656478), (-13.918265418, 8.0357142857), (-15.426633059, 5.9523809524))
            Line((-15.426633059, 5.9523809524), (-10.3098262355, 5.9523809524))
            Line((-10.3098262355, 5.9523809524), (-12.8682296473, 10.3836656478))
        make_face()
        with BuildLine():
            Line((-36.6189362833, 10.3836656478), (-39.177339695, 5.9523809524))
            Line((-39.177339695, 5.9523809524), (-34.0605328715, 5.9523809524))
            ThreePointArc((-34.0605328715, 5.9523809524), (-35.5689005126, 8.0357142857), (-36.6189362833, 10.3836656478))
        make_face()
        with BuildLine():
            Line((-15.426633059, 5.9523809524), (-34.0605328715, 5.9523809524))
            ThreePointArc((-34.0605328715, 5.9523809524), (-24.7435829653, 1.7857142857), (-15.426633059, 5.9523809524))
        make_face()
        with BuildLine():
            ThreePointArc((-27.301986377, 26.521096257), (-35.5689005126, 20.5357142857), (-36.6189362833, 10.3836656478))
            Line((-36.6189362833, 10.3836656478), (-27.301986377, 26.521096257))
        make_face()
        with BuildLine():
            ThreePointArc((-12.2435829653, 14.2857142857), (-15.0422932921, 22.1682886543), (-22.1851795535, 26.521096257))
            Line((-22.1851795535, 26.521096257), (-12.8682296473, 10.3836656478))
            ThreePointArc((-12.8682296473, 10.3836656478), (-12.4007324745, 12.3098494719), (-12.2435829653, 14.2857142857))
        make_face()
        with BuildLine():
            Line((-24.7435829653, 30.9523809524), (-27.301986377, 26.521096257))
            ThreePointArc((-27.301986377, 26.521096257), (-24.7435829653, 26.7857142857), (-22.1851795535, 26.521096257))
            Line((-22.1851795535, 26.521096257), (-24.7435829653, 30.9523809524))
        make_face()
    extrude(amount=-F4_DEPTH, mode=Mode.SUBTRACT)


solid = f1.part
